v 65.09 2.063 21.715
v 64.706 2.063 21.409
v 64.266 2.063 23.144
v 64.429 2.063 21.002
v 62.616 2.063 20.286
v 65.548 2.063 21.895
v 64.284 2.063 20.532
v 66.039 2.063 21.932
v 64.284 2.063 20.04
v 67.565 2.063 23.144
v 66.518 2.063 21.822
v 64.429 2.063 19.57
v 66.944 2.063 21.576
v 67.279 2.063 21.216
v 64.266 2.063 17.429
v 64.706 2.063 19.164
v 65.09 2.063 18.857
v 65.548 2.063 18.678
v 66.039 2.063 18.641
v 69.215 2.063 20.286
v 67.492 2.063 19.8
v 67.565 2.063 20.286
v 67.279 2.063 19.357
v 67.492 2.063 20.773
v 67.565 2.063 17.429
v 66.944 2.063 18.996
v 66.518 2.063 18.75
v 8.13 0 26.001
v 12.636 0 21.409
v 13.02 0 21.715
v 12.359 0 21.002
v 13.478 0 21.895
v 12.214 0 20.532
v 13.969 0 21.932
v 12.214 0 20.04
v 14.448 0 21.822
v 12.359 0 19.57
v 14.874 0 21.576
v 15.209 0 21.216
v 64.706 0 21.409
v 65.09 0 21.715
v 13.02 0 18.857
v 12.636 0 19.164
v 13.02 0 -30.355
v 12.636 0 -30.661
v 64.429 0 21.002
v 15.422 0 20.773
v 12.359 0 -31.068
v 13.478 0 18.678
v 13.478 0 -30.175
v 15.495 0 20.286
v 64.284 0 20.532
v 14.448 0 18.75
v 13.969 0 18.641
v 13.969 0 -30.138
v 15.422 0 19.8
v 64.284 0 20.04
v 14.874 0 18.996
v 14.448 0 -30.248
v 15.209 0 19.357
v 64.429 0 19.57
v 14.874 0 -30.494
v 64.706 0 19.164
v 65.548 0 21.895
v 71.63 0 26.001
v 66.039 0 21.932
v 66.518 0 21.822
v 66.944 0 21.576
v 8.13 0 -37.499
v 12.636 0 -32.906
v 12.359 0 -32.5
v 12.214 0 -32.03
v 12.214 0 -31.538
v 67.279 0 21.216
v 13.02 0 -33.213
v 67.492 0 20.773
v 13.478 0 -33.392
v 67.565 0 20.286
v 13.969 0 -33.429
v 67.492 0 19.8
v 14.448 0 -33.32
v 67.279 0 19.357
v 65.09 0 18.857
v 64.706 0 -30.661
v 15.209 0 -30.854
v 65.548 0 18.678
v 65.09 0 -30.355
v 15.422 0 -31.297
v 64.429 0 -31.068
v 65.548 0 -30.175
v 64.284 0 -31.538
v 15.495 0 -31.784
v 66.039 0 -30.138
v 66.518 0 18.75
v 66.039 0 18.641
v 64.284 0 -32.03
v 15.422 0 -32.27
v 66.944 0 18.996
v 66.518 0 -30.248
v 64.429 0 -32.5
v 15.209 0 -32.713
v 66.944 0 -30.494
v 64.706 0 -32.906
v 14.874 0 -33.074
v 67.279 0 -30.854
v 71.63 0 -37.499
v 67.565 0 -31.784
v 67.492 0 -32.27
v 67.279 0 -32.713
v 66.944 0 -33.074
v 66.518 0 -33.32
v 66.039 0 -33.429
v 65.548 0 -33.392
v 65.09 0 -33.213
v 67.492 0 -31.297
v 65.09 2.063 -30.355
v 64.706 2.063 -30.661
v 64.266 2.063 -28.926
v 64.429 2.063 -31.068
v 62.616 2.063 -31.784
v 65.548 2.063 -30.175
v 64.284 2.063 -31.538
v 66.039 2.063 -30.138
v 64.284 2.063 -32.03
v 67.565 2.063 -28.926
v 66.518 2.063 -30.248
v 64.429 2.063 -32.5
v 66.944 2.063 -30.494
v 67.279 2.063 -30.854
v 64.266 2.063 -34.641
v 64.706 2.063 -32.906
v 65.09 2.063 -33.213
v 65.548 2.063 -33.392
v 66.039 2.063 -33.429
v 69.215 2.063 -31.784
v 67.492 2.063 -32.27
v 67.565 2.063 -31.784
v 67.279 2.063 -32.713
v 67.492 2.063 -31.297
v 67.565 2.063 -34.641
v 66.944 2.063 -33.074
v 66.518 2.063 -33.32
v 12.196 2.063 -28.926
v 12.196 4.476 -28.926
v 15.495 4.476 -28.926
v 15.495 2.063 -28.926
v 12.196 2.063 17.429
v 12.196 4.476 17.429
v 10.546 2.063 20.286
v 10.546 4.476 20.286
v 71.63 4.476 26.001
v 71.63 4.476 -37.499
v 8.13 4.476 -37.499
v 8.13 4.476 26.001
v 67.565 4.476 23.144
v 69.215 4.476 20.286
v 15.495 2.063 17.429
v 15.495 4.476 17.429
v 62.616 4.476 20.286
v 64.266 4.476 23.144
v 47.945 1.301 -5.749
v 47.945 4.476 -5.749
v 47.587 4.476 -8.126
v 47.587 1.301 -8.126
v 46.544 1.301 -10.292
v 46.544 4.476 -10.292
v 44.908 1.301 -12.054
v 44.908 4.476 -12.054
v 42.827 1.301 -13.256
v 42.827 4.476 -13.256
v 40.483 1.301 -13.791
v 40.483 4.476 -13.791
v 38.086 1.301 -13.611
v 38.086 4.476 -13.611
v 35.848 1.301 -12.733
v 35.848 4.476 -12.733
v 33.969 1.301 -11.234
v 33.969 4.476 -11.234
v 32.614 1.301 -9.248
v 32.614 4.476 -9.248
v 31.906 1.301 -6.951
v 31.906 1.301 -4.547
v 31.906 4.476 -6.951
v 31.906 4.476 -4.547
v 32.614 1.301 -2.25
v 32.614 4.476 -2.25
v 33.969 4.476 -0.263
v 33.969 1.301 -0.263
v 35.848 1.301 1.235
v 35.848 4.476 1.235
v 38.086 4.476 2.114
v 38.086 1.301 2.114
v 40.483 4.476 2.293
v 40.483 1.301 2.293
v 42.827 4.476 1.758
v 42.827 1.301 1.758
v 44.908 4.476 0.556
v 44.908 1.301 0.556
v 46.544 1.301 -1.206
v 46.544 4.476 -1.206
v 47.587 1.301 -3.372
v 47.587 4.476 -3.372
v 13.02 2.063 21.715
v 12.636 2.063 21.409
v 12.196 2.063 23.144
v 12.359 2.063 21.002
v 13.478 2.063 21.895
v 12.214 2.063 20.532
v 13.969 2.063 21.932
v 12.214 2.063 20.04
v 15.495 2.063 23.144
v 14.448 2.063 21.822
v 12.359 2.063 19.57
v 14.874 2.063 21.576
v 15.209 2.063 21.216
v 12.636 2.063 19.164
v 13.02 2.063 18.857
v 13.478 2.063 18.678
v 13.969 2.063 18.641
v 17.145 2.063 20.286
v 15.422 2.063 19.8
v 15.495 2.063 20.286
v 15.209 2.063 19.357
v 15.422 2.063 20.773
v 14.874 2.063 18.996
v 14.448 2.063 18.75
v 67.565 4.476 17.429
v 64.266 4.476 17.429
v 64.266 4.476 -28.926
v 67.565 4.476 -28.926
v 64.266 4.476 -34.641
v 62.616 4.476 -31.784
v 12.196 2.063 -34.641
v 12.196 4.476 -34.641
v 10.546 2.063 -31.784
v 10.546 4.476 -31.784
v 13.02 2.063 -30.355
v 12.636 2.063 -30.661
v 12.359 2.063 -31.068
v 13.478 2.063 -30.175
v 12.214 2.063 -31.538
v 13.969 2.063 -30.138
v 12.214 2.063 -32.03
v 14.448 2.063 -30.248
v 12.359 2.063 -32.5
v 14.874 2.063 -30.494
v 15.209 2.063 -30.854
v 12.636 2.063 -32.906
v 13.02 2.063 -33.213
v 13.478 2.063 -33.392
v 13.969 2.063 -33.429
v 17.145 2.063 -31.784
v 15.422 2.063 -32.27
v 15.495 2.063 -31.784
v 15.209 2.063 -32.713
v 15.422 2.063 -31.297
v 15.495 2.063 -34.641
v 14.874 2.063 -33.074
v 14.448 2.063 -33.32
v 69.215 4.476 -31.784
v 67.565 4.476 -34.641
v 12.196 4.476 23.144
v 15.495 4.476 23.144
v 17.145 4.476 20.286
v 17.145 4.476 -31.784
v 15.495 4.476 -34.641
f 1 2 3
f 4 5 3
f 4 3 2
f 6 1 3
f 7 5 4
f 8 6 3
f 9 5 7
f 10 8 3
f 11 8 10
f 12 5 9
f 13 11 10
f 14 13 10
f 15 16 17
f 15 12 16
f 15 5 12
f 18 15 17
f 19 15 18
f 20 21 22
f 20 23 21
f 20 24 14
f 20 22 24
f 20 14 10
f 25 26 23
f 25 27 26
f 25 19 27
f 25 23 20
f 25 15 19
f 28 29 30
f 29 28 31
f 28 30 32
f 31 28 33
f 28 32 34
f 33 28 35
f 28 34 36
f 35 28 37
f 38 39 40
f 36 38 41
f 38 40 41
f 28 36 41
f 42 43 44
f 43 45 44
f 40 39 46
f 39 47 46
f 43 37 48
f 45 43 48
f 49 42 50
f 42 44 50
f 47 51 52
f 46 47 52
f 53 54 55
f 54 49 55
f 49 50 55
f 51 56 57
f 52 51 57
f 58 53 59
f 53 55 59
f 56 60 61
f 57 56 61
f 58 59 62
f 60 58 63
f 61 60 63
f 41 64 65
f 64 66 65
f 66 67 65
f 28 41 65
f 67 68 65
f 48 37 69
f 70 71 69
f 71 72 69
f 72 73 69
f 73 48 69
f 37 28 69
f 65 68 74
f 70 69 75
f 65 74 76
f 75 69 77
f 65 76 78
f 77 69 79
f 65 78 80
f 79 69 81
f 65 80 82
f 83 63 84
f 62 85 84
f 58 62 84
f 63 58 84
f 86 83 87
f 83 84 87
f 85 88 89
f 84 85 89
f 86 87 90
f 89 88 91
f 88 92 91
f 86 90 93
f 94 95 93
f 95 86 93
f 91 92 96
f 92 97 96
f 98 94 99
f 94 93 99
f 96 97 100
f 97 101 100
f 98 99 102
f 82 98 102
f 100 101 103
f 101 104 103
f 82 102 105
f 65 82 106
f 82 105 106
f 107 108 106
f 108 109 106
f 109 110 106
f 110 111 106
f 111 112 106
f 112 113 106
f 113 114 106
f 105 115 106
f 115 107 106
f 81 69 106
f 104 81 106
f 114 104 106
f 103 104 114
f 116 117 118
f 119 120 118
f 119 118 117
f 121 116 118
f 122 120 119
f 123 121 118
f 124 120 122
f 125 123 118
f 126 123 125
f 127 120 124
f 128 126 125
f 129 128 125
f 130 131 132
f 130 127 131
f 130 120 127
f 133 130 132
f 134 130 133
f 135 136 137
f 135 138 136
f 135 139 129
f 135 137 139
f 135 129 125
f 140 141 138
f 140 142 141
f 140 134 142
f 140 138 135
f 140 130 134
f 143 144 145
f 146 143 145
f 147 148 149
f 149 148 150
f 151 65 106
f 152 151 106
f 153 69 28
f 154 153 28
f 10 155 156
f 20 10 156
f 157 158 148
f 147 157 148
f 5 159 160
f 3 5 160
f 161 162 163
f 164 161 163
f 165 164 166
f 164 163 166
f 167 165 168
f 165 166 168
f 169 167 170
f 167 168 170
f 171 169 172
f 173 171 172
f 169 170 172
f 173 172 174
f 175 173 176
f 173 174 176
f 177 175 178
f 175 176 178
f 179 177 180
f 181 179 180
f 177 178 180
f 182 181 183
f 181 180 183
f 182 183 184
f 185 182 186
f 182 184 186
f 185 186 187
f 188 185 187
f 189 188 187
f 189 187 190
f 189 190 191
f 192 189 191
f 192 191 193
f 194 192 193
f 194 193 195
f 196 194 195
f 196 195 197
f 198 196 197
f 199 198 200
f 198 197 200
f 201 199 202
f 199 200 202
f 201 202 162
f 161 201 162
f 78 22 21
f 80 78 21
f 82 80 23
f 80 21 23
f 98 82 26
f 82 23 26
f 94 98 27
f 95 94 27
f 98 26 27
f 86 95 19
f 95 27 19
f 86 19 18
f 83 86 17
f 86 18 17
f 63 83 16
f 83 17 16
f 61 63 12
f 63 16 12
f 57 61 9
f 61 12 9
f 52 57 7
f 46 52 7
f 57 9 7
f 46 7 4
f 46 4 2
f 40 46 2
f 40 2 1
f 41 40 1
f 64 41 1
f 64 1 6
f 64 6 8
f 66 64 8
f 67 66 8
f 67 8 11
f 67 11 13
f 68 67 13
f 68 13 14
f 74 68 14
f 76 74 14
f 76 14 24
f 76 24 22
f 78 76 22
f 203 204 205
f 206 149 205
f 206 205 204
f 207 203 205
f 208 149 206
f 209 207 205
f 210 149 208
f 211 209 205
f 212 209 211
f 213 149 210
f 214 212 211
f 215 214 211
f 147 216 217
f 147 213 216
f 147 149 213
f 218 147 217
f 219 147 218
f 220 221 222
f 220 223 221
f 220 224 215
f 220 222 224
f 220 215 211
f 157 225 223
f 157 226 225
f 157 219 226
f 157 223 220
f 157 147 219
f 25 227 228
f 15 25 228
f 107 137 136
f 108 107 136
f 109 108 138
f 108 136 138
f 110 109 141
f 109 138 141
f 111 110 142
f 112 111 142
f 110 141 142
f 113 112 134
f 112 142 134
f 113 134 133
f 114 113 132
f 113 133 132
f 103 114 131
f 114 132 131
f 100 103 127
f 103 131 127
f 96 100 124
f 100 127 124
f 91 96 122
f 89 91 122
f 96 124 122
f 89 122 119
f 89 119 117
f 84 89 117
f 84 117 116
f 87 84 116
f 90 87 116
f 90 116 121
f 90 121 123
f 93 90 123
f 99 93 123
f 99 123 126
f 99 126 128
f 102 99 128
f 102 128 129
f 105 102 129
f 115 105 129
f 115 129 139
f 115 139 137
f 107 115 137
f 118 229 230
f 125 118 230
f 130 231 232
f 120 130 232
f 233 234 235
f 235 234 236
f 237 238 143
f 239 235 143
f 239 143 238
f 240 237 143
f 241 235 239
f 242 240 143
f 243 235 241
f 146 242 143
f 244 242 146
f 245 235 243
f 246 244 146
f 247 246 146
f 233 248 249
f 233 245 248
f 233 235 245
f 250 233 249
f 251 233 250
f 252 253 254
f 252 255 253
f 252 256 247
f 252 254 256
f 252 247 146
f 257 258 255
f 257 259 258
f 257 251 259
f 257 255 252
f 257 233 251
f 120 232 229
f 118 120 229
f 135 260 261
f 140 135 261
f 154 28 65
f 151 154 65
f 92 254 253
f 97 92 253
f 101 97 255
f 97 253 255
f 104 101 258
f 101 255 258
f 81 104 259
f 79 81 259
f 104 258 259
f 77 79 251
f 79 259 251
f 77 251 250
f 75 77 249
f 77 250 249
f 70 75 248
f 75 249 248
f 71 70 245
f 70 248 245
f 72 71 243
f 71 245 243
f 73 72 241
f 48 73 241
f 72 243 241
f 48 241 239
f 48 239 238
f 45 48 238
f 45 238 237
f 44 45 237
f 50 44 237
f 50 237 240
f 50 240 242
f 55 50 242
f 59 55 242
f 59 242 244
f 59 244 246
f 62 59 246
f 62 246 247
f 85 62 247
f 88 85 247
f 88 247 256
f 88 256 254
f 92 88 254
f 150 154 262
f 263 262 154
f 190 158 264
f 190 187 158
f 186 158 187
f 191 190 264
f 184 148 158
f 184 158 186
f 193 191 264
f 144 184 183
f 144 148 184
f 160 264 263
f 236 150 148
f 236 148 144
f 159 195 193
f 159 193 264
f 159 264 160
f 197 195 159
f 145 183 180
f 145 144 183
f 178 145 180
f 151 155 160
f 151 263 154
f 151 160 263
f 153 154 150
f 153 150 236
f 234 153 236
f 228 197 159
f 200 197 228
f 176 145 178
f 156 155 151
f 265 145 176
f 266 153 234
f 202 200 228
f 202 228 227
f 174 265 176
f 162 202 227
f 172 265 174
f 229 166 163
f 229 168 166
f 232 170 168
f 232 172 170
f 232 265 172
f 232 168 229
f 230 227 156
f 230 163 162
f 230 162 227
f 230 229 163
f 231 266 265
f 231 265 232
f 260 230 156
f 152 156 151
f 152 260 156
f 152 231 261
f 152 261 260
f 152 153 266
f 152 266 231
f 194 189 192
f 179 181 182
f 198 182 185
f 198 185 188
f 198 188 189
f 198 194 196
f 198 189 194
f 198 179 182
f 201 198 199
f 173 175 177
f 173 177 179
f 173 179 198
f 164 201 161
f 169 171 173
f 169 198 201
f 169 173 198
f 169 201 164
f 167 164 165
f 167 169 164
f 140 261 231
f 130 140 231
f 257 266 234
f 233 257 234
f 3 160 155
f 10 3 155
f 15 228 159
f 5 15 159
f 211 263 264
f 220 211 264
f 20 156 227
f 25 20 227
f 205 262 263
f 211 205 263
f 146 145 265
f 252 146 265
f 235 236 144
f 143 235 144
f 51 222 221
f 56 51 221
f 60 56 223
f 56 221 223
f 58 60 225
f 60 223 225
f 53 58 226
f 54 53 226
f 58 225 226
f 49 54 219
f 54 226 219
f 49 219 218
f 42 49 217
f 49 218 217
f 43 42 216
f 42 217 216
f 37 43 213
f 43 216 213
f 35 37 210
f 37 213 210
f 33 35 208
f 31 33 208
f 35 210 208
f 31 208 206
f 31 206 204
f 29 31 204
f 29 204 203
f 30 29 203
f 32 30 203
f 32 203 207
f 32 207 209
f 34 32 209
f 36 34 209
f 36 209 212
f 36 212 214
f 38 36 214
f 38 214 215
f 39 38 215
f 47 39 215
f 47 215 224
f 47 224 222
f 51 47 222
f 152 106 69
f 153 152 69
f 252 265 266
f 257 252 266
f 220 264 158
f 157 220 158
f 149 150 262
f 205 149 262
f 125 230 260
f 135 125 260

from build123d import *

# Parameters (mm, degrees)
BOSS_EXTRUDE1_DEPTH = 4.476
CUT_EXTRUDE1_DEPTH  = 2.413
SKETCH4_R           = 1.65
CUT_EXTRUDE2_DEPTH  = 5.476
SKETCH5_R           = 8.0645
CUT_EXTRUDE3_DEPTH  = 3.175


with BuildPart() as part:
    # Sketch1 → Boss-Extrude1 (new body)
    with BuildSketch(Plane(origin=(0, 0, 0), x_dir=(1, 0, 0), z_dir=(0, 1, 0))):
        Polygon((8.13035809, -26.001312997), (71.63035809, -26.001312997), (71.63035809, -13.301312997), (71.63035809, 15.908687003), (71.63035809, 37.498687003), (8.13035809, 37.498687003), (8.13035809, 22.258687003), (8.13035809, -19.651312997), align=None)
    extrude(amount=BOSS_EXTRUDE1_DEPTH)

    # Sketch2 → Cut-Extrude1 (cut)
    with BuildSketch(Plane(origin=(0, 4.476, 0), x_dir=(1, 0, 0), z_dir=(0, 1, 0))):
        Polygon((64.265579696, 28.926187003), (67.565136484, 28.926187003), (69.214914879, 31.783687003), (67.565136484, 34.641187003), (64.265579696, 34.641187003), (62.615801302, 31.783687003), align=None)
        Polygon((17.144914879, 31.783687003), (15.495136484, 34.641187003), (12.195579696, 34.641187003), (10.545801302, 31.783687003), (12.195579696, 28.926187003), (15.495136484, 28.926187003), align=None)
        Polygon((64.265579696, -23.143812997), (67.565136484, -23.143812997), (69.214914879, -20.286312997), (67.565136484, -17.428812997), (64.265579696, -17.428812997), (62.615801302, -20.286312997), align=None)
        Polygon((12.195579696, -23.143812997), (15.495136484, -23.143812997), (17.144914879, -20.286312997), (15.495136484, -17.428812997), (12.195579696, -17.428812997), (10.545801302, -20.286312997), align=None)
    extrude(amount=-CUT_EXTRUDE1_DEPTH, mode=Mode.SUBTRACT)

    # Sketch4 → Cut-Extrude2 (cut, through all)
    with BuildSketch(Plane(origin=(0, 4.476, 0), x_dir=(1, 0, 0), z_dir=(0, 1, 0))):
        with Locations((65.91535809, 31.783687003)):
            Circle(SKETCH4_R)
        with Locations((13.84535809, 31.783687003)):
            Circle(SKETCH4_R)
        with Locations((65.91535809, -20.286312997)):
            Circle(SKETCH4_R)
        with Locations((13.84535809, -20.286312997)):
            Circle(SKETCH4_R)
    extrude(amount=-CUT_EXTRUDE2_DEPTH, mode=Mode.SUBTRACT)

    # Sketch5 → Cut-Extrude3 (cut)
    with BuildSketch(Plane(origin=(0, 4.476, 0), x_dir=(1, 0, 0), z_dir=(0, 1, 0))):
        with Locations((39.88035809, 5.748687003)):
            Circle(SKETCH5_R)
    extrude(amount=-CUT_EXTRUDE3_DEPTH, mode=Mode.SUBTRACT)


solid = part.part
